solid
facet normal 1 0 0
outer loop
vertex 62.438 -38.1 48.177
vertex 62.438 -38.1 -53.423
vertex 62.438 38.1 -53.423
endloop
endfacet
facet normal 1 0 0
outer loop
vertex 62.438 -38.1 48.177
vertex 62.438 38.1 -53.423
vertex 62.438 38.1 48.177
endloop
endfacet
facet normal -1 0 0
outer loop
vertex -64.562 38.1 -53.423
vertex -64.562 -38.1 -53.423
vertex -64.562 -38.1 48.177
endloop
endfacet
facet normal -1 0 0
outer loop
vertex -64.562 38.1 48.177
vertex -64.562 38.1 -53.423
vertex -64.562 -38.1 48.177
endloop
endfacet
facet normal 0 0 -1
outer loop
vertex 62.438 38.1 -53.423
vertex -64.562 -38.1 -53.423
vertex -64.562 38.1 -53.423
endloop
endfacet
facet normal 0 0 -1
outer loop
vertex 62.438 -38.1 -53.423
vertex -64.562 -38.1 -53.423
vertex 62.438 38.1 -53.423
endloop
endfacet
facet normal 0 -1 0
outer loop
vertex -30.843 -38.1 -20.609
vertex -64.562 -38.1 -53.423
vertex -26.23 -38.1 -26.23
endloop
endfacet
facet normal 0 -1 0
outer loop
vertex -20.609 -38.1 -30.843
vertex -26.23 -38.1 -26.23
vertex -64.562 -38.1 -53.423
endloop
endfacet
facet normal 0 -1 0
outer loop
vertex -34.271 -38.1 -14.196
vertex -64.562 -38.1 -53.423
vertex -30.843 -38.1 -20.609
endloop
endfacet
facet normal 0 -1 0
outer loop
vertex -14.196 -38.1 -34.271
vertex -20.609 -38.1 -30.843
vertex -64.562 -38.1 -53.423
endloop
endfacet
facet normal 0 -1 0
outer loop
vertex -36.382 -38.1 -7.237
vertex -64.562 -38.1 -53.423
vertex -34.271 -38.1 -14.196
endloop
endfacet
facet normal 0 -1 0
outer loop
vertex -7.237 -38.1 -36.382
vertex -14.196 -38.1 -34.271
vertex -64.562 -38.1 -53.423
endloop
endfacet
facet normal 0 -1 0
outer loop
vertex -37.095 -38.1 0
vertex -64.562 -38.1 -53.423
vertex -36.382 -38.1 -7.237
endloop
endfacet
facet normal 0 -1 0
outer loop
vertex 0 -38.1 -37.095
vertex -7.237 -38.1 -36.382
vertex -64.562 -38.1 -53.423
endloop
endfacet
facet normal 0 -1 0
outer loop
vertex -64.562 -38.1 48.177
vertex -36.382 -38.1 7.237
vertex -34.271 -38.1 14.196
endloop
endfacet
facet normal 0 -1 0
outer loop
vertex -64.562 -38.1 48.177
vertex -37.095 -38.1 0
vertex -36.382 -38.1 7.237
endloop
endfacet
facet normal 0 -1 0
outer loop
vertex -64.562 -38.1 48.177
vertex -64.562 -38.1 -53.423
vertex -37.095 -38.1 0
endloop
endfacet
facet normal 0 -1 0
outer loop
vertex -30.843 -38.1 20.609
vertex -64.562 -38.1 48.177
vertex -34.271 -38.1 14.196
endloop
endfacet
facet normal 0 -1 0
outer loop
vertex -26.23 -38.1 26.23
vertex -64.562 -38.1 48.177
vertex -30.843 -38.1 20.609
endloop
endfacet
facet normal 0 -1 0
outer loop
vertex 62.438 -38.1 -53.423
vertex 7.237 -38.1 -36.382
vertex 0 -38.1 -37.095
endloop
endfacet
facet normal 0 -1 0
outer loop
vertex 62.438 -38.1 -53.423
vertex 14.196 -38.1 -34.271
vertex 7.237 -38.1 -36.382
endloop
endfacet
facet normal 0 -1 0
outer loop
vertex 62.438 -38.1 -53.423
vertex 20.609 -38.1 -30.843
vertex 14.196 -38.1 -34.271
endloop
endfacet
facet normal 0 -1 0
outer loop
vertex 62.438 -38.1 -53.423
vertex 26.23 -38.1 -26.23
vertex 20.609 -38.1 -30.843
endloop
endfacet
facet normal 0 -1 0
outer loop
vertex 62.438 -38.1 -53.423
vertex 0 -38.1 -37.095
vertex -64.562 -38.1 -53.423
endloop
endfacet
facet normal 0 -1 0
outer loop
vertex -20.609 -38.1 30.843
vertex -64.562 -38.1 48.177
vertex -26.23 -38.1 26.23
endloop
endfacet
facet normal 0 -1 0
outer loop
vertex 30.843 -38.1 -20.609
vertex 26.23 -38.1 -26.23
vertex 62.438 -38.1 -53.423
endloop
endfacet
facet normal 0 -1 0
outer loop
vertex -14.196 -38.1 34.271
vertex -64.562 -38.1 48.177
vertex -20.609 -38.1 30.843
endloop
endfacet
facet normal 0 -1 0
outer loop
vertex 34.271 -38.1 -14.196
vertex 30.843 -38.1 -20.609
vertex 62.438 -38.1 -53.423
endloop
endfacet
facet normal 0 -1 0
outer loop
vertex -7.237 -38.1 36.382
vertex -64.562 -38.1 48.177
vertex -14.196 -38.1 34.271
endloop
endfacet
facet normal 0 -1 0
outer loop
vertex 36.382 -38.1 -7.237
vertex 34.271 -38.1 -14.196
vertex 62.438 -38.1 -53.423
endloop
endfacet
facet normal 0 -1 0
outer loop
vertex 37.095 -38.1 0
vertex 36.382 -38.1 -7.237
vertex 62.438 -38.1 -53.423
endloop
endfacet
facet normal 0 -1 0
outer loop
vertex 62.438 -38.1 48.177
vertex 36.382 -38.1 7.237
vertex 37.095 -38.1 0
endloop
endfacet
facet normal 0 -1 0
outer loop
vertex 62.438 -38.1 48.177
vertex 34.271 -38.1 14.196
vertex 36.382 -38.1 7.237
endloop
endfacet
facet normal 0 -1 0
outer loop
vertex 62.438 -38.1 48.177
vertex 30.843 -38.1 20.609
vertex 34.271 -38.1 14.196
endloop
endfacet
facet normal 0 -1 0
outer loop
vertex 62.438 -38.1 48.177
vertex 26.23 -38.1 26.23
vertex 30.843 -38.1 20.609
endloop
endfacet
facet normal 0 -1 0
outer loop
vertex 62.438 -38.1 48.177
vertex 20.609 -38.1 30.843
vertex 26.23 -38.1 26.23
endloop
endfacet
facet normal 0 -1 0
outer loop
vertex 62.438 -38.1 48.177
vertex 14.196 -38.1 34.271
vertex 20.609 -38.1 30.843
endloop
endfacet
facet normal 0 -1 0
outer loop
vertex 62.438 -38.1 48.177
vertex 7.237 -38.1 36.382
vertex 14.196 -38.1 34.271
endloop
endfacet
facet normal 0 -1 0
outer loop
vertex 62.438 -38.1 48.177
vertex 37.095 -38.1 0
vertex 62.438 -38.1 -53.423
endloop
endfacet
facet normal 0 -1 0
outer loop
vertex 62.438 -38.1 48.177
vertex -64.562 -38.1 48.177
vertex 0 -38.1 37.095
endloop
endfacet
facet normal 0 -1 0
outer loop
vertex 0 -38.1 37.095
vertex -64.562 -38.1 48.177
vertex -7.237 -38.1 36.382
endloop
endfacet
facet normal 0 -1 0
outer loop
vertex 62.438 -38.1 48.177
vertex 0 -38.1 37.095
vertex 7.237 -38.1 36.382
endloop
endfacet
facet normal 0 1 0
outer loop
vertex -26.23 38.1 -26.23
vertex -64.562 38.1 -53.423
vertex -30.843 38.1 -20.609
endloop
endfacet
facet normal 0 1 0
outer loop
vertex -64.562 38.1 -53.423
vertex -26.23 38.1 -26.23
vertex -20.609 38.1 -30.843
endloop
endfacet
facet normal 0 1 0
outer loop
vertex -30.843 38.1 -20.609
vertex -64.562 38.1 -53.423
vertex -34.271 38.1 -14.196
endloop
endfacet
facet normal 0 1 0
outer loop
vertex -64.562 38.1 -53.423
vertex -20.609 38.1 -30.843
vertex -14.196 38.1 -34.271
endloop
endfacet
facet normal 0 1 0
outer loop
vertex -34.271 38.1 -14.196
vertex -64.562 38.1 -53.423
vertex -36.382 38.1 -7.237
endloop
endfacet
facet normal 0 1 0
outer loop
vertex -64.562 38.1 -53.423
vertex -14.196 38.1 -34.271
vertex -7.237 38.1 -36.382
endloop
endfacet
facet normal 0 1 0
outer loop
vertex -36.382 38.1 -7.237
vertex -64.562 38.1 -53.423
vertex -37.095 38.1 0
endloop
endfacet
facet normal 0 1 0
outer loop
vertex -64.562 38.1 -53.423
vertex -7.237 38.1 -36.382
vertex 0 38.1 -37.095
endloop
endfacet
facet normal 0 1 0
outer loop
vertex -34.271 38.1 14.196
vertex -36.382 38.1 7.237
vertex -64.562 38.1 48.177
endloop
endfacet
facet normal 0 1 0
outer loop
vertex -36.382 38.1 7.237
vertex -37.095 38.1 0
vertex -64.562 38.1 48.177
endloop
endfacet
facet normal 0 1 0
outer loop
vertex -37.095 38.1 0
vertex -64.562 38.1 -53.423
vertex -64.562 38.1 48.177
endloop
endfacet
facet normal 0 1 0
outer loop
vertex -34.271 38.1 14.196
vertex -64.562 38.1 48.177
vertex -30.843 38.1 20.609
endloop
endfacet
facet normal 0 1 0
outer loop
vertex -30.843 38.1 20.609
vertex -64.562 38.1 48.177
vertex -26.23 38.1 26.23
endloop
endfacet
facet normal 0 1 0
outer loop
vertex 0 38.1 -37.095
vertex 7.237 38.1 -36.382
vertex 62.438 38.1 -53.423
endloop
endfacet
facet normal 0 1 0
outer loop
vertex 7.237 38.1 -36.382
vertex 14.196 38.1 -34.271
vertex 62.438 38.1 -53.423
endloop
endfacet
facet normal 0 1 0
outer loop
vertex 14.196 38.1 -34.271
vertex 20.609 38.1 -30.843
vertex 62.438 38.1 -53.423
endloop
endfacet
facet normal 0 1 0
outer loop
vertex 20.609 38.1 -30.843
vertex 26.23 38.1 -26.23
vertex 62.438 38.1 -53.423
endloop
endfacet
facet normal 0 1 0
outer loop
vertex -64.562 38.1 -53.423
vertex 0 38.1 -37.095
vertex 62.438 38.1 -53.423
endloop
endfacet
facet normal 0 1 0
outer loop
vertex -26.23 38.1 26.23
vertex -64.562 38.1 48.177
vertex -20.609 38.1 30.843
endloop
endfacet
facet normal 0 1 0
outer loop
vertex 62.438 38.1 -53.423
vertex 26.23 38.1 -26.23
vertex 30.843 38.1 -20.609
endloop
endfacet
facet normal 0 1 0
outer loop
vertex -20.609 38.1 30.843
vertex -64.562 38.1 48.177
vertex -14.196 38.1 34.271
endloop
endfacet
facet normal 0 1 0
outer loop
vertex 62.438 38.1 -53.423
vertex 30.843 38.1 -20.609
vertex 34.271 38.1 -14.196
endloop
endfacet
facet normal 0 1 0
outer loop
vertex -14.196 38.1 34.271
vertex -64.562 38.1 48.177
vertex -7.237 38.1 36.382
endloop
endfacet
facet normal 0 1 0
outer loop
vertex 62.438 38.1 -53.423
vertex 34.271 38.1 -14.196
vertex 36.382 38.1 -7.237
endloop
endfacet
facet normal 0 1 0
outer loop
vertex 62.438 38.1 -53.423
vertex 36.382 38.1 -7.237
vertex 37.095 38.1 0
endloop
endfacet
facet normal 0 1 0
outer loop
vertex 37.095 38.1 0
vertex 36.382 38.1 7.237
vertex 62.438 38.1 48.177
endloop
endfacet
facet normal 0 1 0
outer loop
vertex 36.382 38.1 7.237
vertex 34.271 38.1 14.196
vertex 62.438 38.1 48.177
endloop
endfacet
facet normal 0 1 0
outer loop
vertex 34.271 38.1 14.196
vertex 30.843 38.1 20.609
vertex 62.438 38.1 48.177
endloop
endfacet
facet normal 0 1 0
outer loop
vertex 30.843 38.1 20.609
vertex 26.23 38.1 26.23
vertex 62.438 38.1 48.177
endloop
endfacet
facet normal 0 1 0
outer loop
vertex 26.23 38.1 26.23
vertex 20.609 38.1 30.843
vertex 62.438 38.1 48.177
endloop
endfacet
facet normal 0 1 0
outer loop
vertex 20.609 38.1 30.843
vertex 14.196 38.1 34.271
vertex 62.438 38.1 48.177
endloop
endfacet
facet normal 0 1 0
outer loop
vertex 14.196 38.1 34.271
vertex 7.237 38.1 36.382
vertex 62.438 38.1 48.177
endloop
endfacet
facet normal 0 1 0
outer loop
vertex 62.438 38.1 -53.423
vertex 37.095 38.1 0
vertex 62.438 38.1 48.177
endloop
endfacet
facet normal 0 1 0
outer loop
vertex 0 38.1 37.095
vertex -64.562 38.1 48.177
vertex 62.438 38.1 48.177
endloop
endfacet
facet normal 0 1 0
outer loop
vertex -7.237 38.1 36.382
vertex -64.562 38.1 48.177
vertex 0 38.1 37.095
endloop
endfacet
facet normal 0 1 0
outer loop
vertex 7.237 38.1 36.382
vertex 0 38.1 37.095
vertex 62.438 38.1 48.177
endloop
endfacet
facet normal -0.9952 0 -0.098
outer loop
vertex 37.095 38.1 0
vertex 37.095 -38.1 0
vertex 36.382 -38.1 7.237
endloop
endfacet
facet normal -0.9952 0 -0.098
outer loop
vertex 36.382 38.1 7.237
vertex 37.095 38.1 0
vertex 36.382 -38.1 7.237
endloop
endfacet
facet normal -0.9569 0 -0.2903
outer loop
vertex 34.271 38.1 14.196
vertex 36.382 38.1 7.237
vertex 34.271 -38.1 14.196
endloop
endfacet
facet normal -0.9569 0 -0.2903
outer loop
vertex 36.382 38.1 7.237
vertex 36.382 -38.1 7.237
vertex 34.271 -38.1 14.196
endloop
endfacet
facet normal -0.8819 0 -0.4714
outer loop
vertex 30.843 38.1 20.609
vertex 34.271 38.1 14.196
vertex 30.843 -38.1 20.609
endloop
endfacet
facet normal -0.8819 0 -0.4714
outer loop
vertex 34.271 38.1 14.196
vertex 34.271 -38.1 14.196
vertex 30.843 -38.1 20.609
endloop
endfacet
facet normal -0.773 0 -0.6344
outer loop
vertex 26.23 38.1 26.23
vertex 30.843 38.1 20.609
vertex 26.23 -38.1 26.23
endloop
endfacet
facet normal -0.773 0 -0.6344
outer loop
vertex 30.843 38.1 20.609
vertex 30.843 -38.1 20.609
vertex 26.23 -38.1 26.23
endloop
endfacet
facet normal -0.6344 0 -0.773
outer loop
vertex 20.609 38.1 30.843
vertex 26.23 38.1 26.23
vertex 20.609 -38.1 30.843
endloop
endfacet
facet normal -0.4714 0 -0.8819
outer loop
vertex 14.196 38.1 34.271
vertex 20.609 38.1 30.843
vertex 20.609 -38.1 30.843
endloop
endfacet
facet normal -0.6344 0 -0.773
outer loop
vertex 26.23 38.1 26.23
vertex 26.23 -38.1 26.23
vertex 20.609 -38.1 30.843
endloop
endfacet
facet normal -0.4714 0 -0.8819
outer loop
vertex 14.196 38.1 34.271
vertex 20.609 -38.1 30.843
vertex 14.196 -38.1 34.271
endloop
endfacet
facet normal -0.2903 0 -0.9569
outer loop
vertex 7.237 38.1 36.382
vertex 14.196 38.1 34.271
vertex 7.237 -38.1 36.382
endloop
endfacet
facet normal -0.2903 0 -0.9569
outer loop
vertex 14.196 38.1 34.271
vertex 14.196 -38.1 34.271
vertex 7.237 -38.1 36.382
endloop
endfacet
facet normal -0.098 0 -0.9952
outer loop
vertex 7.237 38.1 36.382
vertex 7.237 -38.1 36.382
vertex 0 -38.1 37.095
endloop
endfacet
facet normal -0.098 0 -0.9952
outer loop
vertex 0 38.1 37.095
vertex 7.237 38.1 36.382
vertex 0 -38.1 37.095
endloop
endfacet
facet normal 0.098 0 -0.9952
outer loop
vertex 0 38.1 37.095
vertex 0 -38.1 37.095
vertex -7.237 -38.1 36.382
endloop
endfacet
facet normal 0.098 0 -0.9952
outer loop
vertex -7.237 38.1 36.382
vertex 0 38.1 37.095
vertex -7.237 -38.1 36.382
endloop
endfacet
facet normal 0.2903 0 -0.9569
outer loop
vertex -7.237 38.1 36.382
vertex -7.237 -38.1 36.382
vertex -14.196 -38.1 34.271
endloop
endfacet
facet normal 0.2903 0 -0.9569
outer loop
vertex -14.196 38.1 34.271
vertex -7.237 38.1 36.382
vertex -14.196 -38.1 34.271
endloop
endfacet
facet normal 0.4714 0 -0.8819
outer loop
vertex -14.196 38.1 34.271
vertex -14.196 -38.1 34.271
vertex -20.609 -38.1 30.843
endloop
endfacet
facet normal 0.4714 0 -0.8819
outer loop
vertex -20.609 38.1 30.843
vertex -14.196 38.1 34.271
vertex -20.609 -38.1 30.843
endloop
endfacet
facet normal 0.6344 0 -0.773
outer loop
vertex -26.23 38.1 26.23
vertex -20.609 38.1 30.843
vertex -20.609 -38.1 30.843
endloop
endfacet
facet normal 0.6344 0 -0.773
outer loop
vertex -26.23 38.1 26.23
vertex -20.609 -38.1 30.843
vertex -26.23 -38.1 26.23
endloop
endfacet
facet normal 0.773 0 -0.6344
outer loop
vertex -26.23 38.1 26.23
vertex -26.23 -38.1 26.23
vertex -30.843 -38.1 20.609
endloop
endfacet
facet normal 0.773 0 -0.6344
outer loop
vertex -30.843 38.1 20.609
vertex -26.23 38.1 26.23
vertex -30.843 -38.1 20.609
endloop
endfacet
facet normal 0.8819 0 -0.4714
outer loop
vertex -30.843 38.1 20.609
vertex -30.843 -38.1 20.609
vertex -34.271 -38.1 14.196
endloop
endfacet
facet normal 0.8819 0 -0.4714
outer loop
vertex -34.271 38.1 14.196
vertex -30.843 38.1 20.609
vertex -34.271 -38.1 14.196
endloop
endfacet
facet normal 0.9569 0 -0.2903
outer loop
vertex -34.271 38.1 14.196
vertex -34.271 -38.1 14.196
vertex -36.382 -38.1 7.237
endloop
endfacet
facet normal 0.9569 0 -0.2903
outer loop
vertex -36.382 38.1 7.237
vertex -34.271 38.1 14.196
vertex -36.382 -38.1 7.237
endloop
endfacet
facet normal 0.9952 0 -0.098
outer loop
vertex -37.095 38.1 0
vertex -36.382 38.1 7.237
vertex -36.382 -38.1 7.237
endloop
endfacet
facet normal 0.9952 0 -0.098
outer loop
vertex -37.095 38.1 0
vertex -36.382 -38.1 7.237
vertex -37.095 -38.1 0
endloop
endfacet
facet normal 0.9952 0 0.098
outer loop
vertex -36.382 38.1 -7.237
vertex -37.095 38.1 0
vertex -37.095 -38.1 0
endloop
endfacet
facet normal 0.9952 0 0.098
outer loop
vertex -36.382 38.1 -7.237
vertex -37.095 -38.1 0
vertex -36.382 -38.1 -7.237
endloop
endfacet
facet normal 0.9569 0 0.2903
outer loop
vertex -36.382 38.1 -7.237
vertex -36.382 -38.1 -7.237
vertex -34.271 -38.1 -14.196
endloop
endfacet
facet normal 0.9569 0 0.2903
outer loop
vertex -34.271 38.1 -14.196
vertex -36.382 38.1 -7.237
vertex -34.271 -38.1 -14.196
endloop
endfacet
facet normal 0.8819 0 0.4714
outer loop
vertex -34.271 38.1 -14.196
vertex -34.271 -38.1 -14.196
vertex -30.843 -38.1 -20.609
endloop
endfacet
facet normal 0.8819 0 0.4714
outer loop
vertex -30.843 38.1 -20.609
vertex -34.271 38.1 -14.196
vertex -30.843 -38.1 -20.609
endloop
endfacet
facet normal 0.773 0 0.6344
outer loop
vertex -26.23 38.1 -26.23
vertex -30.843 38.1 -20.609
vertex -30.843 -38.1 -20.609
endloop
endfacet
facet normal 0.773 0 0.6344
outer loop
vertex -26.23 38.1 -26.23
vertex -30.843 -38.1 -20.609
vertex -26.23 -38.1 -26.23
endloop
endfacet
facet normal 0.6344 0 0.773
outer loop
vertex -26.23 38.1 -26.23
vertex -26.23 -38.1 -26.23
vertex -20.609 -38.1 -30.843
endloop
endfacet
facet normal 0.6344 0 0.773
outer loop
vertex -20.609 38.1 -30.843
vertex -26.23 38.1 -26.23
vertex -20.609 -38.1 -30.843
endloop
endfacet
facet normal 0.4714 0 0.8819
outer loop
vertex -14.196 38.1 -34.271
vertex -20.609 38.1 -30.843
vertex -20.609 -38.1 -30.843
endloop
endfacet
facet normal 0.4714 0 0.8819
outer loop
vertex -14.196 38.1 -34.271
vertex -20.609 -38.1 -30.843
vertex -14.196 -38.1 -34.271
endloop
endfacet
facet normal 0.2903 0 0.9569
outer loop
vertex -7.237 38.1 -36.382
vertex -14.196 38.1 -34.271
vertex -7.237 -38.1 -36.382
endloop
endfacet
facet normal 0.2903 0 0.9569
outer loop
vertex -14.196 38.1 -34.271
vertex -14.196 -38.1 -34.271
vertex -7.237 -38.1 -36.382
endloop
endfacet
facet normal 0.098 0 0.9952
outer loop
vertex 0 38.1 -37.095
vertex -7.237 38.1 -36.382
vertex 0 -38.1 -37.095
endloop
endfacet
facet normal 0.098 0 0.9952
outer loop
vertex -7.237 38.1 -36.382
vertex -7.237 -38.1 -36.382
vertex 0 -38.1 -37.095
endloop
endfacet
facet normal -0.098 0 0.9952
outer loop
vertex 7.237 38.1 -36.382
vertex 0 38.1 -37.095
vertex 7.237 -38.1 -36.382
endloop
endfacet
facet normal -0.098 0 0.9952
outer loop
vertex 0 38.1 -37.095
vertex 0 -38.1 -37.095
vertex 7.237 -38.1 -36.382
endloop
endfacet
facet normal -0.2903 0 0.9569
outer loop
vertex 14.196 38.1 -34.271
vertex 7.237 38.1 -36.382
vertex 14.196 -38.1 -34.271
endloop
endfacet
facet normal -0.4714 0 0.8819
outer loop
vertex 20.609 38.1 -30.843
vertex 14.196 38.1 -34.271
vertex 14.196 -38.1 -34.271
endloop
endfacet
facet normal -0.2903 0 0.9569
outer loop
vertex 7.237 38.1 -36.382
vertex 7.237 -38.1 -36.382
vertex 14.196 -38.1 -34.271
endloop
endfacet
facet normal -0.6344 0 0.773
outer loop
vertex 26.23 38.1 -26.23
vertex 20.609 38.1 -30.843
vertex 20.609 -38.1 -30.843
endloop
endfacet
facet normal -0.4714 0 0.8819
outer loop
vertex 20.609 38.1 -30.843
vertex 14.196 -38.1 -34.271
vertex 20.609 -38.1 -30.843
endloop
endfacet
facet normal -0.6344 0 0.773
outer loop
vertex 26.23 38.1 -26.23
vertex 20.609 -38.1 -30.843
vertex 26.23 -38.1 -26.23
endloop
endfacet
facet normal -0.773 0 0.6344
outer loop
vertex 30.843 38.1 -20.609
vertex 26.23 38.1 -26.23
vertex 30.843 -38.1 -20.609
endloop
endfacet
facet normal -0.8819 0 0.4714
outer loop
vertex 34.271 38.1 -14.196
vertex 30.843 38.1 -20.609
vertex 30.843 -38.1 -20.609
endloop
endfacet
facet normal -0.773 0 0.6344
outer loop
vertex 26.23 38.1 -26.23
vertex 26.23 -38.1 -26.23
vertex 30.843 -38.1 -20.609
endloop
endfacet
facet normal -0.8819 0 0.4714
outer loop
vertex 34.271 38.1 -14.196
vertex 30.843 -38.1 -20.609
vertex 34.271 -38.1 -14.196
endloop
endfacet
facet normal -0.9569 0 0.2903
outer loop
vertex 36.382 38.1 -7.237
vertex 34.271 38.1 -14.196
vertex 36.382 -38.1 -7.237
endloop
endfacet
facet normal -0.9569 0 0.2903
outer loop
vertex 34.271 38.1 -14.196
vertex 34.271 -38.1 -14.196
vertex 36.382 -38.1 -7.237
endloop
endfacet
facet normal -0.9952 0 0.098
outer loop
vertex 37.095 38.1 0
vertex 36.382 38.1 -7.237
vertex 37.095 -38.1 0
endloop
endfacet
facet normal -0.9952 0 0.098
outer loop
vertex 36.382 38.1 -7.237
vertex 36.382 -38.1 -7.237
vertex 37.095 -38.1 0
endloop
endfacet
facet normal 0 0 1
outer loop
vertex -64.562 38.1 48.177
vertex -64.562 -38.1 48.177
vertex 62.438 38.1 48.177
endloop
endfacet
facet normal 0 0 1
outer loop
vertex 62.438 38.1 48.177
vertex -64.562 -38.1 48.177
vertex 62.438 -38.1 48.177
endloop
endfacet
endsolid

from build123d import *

# Parameters (mm, degrees)
F0_W     = 127
F0_H     = 101.6
F1_DEPTH = 38.1
F2_R     = 37.094784
F3_DEPTH = 76.201


with BuildPart() as f1:
    # F0 (on Front) → F1 (new body, symmetric)
    with BuildSketch(Plane.XZ):
        with Locations((-1.06249, -2.622532)):
            Rectangle(F0_W, F0_H)
    extrude(amount=F1_DEPTH, both=True)

    # F2 (on face) → F3 (cut, through all)
    with BuildSketch(Plane.XZ.offset(38.1)):
        Circle(F2_R)
    extrude(amount=-F3_DEPTH, mode=Mode.SUBTRACT)


solid = f1.part
